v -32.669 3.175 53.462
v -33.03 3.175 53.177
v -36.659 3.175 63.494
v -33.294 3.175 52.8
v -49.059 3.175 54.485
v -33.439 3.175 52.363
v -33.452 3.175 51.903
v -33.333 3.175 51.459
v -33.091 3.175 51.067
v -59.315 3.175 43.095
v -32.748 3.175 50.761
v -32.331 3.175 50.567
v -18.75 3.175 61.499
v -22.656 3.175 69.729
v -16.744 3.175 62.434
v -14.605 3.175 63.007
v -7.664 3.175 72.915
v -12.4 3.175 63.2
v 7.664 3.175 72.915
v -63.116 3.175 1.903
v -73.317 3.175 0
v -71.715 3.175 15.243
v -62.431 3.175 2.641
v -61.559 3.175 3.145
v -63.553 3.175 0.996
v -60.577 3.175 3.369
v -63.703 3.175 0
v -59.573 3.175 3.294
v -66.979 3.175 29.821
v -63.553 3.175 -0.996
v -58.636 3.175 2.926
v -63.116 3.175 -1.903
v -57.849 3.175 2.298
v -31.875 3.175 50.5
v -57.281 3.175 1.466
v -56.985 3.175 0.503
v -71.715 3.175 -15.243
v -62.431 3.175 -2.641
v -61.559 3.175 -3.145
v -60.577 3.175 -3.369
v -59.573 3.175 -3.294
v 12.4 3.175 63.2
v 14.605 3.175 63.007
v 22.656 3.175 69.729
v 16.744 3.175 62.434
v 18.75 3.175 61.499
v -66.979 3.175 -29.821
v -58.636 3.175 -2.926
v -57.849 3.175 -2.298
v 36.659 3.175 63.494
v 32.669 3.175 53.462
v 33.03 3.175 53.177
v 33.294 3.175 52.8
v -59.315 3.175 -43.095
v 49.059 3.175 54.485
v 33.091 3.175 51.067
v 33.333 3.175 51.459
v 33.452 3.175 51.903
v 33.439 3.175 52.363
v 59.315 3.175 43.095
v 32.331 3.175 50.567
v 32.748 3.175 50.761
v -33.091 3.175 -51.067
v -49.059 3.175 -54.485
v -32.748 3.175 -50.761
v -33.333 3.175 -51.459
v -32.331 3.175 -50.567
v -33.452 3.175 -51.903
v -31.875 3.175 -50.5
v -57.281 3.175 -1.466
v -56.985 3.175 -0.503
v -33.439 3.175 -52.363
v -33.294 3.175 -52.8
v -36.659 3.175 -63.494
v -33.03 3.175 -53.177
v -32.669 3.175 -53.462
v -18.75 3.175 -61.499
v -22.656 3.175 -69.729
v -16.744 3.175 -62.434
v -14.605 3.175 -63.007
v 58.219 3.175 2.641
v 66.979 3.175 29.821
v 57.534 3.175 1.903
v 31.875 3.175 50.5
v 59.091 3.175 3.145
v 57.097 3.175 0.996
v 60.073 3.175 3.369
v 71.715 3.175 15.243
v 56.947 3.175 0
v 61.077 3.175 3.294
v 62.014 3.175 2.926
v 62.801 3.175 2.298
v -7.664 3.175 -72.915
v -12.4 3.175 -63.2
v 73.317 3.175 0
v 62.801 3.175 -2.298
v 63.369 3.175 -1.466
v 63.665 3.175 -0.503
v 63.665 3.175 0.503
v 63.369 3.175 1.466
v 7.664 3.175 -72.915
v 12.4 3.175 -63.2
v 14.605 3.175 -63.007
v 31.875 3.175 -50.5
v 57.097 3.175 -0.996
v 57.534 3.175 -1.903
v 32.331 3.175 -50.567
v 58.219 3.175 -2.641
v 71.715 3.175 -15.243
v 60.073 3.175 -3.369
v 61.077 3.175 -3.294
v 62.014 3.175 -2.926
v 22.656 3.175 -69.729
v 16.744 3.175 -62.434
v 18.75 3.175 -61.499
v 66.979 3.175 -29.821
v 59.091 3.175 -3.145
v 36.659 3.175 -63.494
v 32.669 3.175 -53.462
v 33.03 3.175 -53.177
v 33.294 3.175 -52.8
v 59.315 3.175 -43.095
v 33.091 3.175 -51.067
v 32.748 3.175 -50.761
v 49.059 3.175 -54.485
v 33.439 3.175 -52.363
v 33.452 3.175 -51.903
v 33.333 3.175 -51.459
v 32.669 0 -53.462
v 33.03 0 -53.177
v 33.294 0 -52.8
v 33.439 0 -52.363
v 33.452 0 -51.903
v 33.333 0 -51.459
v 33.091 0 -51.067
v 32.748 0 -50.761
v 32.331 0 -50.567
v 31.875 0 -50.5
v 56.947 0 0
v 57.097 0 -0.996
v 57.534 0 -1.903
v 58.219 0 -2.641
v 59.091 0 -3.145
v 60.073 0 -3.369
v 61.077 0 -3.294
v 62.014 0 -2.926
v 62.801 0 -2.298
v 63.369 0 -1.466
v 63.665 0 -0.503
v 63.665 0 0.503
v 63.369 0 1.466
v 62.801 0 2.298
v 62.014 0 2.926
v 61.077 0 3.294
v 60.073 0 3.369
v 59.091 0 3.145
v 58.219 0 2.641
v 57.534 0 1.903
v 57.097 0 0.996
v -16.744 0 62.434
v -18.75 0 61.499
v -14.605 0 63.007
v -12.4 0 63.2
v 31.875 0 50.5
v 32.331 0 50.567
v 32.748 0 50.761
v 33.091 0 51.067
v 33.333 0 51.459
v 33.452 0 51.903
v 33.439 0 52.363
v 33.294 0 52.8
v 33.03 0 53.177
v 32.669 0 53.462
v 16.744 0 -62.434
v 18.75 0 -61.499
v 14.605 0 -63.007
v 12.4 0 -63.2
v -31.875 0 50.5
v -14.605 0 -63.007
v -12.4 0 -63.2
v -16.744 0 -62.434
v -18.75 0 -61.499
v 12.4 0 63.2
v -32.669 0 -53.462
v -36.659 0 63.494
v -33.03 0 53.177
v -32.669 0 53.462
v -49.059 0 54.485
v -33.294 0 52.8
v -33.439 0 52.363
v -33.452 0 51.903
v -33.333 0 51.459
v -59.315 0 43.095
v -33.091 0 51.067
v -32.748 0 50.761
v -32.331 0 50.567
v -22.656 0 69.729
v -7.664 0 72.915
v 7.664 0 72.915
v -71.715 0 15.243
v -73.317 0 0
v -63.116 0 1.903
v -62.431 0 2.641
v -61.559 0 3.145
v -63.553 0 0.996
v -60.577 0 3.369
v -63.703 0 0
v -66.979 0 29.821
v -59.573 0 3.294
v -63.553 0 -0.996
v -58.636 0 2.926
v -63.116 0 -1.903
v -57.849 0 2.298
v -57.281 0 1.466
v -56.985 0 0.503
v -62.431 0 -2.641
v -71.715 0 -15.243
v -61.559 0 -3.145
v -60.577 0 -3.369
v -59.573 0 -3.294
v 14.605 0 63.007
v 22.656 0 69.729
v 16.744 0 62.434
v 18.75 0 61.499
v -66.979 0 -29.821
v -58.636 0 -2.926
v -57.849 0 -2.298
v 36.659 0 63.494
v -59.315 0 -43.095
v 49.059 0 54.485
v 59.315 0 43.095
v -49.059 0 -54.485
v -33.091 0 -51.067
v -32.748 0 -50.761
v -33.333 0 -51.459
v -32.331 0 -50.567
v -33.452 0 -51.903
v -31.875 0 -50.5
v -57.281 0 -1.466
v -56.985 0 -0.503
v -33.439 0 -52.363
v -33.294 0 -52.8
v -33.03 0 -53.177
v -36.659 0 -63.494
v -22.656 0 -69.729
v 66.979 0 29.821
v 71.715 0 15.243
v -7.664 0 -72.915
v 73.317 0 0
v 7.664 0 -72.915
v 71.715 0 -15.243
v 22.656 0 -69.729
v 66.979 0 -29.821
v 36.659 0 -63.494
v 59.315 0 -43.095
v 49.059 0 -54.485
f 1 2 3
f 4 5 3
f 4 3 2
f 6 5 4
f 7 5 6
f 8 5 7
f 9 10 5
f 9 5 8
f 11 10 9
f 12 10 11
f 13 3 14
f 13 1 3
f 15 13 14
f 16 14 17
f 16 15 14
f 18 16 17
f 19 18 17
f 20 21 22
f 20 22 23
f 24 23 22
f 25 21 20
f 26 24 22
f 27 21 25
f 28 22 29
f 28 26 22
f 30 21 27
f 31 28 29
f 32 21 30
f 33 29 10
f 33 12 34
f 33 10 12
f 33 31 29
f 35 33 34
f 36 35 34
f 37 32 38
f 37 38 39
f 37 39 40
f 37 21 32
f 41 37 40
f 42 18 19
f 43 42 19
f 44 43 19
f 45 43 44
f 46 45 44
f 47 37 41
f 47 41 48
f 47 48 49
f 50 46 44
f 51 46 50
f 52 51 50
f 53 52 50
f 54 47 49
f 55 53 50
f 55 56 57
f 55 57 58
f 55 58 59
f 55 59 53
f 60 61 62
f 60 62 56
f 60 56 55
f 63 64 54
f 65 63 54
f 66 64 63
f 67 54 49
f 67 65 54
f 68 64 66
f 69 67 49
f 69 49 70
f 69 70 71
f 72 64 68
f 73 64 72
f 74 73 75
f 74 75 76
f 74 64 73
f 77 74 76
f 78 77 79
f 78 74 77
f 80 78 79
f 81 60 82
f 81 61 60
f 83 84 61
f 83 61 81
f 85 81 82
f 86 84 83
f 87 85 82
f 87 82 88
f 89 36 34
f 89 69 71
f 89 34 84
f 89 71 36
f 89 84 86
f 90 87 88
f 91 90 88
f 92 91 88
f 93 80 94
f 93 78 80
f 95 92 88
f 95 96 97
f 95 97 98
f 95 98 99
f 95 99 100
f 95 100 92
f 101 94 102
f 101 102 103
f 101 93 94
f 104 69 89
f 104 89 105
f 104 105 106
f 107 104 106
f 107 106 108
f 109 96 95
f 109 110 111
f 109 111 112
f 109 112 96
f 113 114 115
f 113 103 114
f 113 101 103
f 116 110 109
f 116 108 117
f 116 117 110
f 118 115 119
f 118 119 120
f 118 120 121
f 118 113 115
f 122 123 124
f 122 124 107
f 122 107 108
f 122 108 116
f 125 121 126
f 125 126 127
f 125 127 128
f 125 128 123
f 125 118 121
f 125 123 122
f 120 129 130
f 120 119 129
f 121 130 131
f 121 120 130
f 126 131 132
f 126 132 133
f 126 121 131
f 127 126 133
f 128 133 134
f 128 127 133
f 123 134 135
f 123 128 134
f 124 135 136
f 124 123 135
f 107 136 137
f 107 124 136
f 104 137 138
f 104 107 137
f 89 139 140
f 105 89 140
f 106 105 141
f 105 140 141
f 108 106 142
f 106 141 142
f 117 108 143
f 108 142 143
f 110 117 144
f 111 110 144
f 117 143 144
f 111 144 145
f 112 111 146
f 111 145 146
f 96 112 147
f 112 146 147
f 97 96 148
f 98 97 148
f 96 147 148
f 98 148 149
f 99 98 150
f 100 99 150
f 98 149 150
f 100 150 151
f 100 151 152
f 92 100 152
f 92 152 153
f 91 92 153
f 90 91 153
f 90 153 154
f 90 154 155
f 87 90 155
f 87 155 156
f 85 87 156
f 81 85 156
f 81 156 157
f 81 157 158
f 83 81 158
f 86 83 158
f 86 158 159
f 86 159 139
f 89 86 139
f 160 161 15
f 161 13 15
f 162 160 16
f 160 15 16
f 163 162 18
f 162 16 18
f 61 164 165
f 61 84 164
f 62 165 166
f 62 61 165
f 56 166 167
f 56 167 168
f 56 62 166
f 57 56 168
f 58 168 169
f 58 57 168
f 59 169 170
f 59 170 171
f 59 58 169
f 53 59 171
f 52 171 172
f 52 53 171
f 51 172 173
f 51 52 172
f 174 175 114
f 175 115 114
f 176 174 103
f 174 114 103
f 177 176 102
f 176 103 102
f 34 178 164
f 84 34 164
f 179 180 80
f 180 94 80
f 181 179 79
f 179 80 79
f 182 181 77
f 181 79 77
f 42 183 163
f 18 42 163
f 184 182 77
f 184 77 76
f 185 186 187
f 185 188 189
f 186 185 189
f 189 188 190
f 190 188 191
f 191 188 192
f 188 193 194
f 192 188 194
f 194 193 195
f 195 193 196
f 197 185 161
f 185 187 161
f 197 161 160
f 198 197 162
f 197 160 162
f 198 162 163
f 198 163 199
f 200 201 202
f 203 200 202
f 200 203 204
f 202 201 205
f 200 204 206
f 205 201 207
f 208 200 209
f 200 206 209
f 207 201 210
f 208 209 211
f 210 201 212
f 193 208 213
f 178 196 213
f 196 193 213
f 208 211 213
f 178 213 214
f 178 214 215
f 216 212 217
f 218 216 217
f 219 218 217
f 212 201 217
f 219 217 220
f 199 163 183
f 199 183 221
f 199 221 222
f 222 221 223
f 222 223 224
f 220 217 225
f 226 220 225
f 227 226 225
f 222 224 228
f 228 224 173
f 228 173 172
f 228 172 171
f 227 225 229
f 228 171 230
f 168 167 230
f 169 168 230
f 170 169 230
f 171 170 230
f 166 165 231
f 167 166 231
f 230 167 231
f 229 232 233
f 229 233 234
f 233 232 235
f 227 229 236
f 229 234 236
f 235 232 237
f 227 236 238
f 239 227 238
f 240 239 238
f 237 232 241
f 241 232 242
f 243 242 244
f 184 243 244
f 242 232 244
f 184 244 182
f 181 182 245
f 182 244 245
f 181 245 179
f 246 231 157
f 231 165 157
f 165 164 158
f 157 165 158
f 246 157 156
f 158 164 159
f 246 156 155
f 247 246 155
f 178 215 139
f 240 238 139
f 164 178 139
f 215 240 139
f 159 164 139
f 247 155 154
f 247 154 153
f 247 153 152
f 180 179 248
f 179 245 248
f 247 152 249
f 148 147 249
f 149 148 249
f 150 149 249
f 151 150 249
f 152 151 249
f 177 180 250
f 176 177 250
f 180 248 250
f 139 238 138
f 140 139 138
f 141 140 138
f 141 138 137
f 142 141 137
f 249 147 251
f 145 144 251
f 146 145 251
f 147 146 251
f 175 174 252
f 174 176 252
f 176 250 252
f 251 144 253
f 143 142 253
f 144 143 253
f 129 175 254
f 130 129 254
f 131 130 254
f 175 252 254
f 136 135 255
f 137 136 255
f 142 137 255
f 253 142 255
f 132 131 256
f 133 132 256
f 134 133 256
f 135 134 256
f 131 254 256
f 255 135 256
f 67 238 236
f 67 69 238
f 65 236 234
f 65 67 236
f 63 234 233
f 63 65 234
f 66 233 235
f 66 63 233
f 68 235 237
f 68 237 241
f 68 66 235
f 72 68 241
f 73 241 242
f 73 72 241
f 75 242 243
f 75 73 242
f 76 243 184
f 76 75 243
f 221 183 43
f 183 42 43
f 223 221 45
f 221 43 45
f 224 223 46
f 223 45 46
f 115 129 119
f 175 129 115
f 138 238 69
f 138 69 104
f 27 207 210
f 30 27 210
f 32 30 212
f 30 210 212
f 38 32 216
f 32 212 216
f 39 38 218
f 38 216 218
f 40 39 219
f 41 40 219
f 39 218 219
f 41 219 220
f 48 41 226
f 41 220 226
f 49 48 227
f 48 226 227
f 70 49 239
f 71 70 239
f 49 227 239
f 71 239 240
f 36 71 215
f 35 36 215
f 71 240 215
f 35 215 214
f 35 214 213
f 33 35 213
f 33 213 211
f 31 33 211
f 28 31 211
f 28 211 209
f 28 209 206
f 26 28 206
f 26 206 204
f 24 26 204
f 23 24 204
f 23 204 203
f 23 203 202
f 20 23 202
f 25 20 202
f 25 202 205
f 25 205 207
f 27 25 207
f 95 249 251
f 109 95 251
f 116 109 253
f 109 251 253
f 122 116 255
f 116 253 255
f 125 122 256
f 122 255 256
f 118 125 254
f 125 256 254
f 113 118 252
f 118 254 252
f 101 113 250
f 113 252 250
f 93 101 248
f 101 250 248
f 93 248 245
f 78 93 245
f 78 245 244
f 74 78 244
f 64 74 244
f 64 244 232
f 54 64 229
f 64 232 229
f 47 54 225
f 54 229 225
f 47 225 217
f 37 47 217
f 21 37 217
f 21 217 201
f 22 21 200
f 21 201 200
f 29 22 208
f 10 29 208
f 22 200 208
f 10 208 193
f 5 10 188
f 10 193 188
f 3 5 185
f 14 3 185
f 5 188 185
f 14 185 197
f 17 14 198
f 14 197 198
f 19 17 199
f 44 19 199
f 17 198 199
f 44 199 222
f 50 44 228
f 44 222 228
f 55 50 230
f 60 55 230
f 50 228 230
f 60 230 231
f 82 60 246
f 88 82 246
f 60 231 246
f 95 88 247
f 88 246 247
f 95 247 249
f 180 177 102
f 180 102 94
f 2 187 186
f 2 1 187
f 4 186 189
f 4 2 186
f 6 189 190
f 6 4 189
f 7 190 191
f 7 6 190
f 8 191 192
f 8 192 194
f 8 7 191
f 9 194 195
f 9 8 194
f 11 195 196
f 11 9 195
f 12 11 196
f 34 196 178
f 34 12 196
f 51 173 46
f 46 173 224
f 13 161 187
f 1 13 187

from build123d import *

# Parameters (mm, degrees)
SKETCH2_R               = 73.3171
BOSS_EXTRUDE1_DEPTH     = 3.175
F_1_4_CLEARANCE_HOLE1_D = 6.7564
CUT_EXTRUDE1_START      = -4.175
CUT_EXTRUDE1_DEPTH      = 5.175
FILLET1_R               = 12.7
FILLET2_R               = 1.5875
FILLET1_OF_MIRROR1_R    = 12.7
FILLET2_OF_MIRROR1_R    = 1.5875


with BuildPart() as part:
    # Sketch2 → Boss-Extrude1 (new body)
    with BuildSketch(Plane(origin=(0, 0, 0), x_dir=(1, 0, 0), z_dir=(0, 1, 0))):
        Circle(SKETCH2_R)
    extrude(amount=BOSS_EXTRUDE1_DEPTH)

    # 1/4 Clearance Hole1 (through all)
    with Locations(Plane(origin=(0, 3.175, 0), x_dir=(1, 0, 0), z_dir=(0, 1, 0))):
        with Locations((-60.325, 0), (60.325, 0)):
            Hole(F_1_4_CLEARANCE_HOLE1_D / 2)

    # Sketch5 → Cut-Extrude1 (cut)
    with BuildSketch(Plane(origin=(0, 3.175, 0), x_dir=(1, 0, 0), z_dir=(0, 1, 0)).offset(CUT_EXTRUDE1_START)):
        Polygon((0, 63.2), (-15.802954744, 63.2), (-37.8, 50.5), (0, 50.5), align=None)
        Polygon((15.802954744, 63.2), (0, 63.2), (0, 50.5), (37.8, 50.5), align=None)
    cut_extrude1 = extrude(amount=CUT_EXTRUDE1_DEPTH, mode=Mode.SUBTRACT)

    # Fillet1
    fillet1_edges = [part.edges().sort_by_distance(p)[0] for p in [
        (-15.802954744, 1.5875, -63.2),
        (15.802954744, 1.5875, -63.2),
    ]]
    fillet(fillet1_edges, radius=FILLET1_R)

    # Fillet2
    fillet2_edges = [part.edges().sort_by_distance(p)[0] for p in [
        (-37.8, 1.5875, -50.5),
        (37.8, 1.5875, -50.5),
    ]]
    fillet(fillet2_edges, radius=FILLET2_R)

    # Mirror1: Cut-Extrude1 across plane
    add(cut_extrude1.mirror(Plane.XY), mode=Mode.SUBTRACT)

    # Fillet1 of Mirror1
    fillet1_of_mirror1_edges = [part.edges().sort_by_distance(p)[0] for p in [
        (-15.802954744, 1.5875, 63.2),
        (15.802954744, 1.5875, 63.2),
    ]]
    fillet(fillet1_of_mirror1_edges, radius=FILLET1_OF_MIRROR1_R)

    # Fillet2 of Mirror1
    fillet2_of_mirror1_edges = [part.edges().sort_by_distance(p)[0] for p in [
        (-37.8, 1.5875, 50.5),
        (37.8, 1.5875, 50.5),
    ]]
    fillet(fillet2_of_mirror1_edges, radius=FILLET2_OF_MIRROR1_R)


solid = part.part
